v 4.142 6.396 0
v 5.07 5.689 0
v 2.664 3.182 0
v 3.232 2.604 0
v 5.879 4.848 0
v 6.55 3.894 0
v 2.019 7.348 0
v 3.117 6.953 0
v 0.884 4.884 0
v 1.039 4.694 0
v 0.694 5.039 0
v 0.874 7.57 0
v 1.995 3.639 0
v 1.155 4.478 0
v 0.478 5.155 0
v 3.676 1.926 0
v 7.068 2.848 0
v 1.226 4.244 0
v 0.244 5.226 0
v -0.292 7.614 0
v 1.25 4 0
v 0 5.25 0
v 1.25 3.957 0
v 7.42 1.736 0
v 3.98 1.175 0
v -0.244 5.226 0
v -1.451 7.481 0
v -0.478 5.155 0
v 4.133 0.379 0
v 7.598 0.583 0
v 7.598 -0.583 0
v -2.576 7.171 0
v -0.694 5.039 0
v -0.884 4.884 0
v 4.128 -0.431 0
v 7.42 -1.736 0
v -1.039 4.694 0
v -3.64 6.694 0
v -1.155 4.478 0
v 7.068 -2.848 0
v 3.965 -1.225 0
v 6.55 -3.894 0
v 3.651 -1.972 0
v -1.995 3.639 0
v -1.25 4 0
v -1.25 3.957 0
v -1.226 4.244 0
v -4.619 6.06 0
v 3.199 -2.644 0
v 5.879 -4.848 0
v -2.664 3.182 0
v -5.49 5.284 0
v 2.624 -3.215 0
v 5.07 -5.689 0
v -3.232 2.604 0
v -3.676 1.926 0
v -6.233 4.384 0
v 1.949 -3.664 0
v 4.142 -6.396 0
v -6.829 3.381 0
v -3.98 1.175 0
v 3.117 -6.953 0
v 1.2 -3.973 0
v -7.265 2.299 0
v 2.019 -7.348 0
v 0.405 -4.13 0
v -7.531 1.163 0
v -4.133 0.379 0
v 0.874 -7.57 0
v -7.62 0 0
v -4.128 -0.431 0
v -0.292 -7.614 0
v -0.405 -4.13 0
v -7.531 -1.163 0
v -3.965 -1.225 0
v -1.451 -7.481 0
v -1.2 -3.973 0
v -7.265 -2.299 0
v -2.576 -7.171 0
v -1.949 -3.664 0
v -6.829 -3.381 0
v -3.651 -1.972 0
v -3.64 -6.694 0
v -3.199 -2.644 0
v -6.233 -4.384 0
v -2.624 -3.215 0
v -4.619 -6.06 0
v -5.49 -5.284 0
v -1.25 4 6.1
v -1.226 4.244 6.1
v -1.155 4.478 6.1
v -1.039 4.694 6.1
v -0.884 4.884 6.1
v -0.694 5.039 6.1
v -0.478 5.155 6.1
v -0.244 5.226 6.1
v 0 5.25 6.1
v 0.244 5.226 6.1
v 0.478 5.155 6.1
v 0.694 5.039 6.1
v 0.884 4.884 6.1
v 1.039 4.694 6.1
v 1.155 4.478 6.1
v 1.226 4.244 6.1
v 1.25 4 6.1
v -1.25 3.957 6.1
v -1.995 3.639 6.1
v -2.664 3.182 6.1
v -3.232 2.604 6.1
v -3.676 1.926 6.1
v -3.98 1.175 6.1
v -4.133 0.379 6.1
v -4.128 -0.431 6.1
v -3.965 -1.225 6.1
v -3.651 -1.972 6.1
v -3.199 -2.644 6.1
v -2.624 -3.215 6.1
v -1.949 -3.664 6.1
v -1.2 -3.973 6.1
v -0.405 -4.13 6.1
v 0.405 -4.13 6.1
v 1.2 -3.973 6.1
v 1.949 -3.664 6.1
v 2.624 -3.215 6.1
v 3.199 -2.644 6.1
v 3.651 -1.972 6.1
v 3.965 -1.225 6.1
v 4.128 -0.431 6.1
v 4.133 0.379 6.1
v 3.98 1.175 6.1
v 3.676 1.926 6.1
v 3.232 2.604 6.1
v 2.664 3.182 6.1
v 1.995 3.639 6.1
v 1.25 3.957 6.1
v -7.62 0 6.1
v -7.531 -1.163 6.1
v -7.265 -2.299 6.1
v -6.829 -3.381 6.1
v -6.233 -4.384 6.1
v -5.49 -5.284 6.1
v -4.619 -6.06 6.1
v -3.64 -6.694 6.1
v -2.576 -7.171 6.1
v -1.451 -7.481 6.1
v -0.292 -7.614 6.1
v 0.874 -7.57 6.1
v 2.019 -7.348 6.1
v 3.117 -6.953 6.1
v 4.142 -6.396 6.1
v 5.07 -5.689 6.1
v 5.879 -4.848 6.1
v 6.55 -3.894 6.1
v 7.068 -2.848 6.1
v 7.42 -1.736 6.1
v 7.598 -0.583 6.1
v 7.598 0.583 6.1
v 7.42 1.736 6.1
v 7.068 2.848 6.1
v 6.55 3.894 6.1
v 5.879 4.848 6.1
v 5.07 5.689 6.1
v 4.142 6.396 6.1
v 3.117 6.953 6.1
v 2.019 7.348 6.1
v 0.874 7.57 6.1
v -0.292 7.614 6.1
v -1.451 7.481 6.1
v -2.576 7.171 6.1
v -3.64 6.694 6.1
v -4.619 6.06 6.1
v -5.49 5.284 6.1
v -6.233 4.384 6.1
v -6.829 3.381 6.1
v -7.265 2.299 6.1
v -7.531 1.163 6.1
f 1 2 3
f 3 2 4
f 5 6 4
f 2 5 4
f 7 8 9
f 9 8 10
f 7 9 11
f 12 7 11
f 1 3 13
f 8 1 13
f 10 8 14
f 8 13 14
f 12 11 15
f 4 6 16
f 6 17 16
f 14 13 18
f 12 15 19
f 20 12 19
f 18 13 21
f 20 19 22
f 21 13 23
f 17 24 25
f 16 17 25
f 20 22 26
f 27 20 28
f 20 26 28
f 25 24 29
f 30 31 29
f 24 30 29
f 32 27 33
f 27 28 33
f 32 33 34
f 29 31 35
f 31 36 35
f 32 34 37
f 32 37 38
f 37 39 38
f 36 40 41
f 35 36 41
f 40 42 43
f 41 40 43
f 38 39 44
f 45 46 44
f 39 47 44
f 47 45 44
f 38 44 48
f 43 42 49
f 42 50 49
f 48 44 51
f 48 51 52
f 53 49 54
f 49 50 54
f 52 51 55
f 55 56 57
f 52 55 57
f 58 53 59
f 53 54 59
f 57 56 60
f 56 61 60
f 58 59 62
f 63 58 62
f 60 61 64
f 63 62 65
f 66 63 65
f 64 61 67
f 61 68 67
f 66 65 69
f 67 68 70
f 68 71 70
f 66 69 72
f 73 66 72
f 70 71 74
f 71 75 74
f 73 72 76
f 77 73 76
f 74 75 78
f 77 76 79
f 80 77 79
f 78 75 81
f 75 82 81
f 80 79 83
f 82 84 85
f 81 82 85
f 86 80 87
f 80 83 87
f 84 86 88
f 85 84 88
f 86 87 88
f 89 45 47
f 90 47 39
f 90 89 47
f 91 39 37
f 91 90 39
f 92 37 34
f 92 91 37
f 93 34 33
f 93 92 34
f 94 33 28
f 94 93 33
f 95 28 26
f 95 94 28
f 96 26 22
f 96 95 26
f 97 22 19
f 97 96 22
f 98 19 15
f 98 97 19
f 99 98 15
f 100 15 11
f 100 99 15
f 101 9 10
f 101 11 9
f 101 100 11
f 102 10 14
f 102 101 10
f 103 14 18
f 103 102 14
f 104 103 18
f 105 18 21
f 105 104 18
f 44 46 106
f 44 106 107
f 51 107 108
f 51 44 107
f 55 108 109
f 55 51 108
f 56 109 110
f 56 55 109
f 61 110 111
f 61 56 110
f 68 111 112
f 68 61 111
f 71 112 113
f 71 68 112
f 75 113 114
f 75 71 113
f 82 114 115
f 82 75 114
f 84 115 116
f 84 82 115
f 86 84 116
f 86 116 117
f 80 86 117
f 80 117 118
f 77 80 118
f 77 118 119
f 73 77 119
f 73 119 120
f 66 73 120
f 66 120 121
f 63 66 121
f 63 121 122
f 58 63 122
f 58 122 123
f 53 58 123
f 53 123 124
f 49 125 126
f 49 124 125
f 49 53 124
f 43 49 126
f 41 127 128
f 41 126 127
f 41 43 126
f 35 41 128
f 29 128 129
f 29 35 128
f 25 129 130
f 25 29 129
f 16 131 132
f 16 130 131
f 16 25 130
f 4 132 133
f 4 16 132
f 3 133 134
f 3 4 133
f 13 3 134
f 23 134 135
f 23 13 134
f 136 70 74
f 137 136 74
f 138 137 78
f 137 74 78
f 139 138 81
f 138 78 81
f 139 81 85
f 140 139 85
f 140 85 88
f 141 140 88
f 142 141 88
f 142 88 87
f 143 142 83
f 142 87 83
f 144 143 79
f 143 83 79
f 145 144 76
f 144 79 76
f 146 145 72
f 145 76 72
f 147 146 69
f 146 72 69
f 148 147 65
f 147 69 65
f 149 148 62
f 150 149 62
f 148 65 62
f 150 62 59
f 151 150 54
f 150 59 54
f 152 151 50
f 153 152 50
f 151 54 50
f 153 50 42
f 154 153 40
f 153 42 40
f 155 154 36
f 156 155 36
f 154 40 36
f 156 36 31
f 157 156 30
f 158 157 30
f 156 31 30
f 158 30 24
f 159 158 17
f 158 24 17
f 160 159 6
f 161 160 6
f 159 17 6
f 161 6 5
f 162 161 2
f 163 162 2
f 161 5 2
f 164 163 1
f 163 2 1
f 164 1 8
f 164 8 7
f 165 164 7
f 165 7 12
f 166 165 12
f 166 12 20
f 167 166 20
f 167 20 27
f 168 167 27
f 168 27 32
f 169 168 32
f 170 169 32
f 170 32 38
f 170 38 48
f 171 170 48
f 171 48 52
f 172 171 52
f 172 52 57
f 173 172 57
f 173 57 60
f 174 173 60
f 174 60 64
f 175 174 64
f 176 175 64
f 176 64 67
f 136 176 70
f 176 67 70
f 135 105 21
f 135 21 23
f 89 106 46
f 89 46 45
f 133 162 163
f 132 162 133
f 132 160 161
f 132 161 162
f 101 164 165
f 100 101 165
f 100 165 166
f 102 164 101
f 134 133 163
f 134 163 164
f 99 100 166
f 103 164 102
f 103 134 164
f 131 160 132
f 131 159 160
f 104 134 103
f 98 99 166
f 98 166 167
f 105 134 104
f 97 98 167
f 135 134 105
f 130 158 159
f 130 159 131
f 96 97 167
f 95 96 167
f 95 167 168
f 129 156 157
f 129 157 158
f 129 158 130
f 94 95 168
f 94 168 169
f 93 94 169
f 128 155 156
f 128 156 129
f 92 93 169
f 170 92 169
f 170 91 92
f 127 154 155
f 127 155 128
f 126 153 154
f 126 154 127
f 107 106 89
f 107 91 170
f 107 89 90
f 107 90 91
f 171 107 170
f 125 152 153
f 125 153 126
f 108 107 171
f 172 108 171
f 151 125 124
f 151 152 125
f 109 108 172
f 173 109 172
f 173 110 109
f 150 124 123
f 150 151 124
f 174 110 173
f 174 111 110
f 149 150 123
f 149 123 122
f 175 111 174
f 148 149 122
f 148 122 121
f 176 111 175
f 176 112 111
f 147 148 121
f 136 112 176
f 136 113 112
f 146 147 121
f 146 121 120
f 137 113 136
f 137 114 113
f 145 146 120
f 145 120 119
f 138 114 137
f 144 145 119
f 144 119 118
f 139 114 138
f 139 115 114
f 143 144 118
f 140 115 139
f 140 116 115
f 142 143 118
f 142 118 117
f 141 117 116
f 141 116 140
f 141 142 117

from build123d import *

# Parameters (mm, degrees)
CROQUIS1_R              = 7.62
CROQUIS1_R_2            = 4.15
SALIENTE_EXTRUIR1_DEPTH = 6.099999992
CORTAR_EXTRUIR1_DEPTH   = 13.383004478


with BuildPart() as part:
    # Croquis1 → Saliente-Extruir1 (new body)
    with BuildSketch(Plane.XY):
        with Locations(Location((0, 0, 0), (0, 0, 180))):
            Circle(CROQUIS1_R)
        with Locations(Location((0, 0, 0), (0, 0, 180))):
            Circle(CROQUIS1_R_2, mode=Mode.SUBTRACT)
    extrude(amount=SALIENTE_EXTRUIR1_DEPTH)

    # Croquis2 → Cortar-Extruir1 (cut, through all)
    with BuildSketch(Plane.XY.offset(6.099999992)):
        with BuildLine():
            Line((-1.25, 0), (-1.25, 4))
            ThreePointArc((-1.25, 4), (0, 5.25), (1.25, 4))
            Line((1.25, 4), (1.25, 0))
            ThreePointArc((1.25, 0), (0, -1.25), (-1.25, 0))
        make_face()
    extrude(amount=-CORTAR_EXTRUIR1_DEPTH, mode=Mode.SUBTRACT)


solid = part.part
